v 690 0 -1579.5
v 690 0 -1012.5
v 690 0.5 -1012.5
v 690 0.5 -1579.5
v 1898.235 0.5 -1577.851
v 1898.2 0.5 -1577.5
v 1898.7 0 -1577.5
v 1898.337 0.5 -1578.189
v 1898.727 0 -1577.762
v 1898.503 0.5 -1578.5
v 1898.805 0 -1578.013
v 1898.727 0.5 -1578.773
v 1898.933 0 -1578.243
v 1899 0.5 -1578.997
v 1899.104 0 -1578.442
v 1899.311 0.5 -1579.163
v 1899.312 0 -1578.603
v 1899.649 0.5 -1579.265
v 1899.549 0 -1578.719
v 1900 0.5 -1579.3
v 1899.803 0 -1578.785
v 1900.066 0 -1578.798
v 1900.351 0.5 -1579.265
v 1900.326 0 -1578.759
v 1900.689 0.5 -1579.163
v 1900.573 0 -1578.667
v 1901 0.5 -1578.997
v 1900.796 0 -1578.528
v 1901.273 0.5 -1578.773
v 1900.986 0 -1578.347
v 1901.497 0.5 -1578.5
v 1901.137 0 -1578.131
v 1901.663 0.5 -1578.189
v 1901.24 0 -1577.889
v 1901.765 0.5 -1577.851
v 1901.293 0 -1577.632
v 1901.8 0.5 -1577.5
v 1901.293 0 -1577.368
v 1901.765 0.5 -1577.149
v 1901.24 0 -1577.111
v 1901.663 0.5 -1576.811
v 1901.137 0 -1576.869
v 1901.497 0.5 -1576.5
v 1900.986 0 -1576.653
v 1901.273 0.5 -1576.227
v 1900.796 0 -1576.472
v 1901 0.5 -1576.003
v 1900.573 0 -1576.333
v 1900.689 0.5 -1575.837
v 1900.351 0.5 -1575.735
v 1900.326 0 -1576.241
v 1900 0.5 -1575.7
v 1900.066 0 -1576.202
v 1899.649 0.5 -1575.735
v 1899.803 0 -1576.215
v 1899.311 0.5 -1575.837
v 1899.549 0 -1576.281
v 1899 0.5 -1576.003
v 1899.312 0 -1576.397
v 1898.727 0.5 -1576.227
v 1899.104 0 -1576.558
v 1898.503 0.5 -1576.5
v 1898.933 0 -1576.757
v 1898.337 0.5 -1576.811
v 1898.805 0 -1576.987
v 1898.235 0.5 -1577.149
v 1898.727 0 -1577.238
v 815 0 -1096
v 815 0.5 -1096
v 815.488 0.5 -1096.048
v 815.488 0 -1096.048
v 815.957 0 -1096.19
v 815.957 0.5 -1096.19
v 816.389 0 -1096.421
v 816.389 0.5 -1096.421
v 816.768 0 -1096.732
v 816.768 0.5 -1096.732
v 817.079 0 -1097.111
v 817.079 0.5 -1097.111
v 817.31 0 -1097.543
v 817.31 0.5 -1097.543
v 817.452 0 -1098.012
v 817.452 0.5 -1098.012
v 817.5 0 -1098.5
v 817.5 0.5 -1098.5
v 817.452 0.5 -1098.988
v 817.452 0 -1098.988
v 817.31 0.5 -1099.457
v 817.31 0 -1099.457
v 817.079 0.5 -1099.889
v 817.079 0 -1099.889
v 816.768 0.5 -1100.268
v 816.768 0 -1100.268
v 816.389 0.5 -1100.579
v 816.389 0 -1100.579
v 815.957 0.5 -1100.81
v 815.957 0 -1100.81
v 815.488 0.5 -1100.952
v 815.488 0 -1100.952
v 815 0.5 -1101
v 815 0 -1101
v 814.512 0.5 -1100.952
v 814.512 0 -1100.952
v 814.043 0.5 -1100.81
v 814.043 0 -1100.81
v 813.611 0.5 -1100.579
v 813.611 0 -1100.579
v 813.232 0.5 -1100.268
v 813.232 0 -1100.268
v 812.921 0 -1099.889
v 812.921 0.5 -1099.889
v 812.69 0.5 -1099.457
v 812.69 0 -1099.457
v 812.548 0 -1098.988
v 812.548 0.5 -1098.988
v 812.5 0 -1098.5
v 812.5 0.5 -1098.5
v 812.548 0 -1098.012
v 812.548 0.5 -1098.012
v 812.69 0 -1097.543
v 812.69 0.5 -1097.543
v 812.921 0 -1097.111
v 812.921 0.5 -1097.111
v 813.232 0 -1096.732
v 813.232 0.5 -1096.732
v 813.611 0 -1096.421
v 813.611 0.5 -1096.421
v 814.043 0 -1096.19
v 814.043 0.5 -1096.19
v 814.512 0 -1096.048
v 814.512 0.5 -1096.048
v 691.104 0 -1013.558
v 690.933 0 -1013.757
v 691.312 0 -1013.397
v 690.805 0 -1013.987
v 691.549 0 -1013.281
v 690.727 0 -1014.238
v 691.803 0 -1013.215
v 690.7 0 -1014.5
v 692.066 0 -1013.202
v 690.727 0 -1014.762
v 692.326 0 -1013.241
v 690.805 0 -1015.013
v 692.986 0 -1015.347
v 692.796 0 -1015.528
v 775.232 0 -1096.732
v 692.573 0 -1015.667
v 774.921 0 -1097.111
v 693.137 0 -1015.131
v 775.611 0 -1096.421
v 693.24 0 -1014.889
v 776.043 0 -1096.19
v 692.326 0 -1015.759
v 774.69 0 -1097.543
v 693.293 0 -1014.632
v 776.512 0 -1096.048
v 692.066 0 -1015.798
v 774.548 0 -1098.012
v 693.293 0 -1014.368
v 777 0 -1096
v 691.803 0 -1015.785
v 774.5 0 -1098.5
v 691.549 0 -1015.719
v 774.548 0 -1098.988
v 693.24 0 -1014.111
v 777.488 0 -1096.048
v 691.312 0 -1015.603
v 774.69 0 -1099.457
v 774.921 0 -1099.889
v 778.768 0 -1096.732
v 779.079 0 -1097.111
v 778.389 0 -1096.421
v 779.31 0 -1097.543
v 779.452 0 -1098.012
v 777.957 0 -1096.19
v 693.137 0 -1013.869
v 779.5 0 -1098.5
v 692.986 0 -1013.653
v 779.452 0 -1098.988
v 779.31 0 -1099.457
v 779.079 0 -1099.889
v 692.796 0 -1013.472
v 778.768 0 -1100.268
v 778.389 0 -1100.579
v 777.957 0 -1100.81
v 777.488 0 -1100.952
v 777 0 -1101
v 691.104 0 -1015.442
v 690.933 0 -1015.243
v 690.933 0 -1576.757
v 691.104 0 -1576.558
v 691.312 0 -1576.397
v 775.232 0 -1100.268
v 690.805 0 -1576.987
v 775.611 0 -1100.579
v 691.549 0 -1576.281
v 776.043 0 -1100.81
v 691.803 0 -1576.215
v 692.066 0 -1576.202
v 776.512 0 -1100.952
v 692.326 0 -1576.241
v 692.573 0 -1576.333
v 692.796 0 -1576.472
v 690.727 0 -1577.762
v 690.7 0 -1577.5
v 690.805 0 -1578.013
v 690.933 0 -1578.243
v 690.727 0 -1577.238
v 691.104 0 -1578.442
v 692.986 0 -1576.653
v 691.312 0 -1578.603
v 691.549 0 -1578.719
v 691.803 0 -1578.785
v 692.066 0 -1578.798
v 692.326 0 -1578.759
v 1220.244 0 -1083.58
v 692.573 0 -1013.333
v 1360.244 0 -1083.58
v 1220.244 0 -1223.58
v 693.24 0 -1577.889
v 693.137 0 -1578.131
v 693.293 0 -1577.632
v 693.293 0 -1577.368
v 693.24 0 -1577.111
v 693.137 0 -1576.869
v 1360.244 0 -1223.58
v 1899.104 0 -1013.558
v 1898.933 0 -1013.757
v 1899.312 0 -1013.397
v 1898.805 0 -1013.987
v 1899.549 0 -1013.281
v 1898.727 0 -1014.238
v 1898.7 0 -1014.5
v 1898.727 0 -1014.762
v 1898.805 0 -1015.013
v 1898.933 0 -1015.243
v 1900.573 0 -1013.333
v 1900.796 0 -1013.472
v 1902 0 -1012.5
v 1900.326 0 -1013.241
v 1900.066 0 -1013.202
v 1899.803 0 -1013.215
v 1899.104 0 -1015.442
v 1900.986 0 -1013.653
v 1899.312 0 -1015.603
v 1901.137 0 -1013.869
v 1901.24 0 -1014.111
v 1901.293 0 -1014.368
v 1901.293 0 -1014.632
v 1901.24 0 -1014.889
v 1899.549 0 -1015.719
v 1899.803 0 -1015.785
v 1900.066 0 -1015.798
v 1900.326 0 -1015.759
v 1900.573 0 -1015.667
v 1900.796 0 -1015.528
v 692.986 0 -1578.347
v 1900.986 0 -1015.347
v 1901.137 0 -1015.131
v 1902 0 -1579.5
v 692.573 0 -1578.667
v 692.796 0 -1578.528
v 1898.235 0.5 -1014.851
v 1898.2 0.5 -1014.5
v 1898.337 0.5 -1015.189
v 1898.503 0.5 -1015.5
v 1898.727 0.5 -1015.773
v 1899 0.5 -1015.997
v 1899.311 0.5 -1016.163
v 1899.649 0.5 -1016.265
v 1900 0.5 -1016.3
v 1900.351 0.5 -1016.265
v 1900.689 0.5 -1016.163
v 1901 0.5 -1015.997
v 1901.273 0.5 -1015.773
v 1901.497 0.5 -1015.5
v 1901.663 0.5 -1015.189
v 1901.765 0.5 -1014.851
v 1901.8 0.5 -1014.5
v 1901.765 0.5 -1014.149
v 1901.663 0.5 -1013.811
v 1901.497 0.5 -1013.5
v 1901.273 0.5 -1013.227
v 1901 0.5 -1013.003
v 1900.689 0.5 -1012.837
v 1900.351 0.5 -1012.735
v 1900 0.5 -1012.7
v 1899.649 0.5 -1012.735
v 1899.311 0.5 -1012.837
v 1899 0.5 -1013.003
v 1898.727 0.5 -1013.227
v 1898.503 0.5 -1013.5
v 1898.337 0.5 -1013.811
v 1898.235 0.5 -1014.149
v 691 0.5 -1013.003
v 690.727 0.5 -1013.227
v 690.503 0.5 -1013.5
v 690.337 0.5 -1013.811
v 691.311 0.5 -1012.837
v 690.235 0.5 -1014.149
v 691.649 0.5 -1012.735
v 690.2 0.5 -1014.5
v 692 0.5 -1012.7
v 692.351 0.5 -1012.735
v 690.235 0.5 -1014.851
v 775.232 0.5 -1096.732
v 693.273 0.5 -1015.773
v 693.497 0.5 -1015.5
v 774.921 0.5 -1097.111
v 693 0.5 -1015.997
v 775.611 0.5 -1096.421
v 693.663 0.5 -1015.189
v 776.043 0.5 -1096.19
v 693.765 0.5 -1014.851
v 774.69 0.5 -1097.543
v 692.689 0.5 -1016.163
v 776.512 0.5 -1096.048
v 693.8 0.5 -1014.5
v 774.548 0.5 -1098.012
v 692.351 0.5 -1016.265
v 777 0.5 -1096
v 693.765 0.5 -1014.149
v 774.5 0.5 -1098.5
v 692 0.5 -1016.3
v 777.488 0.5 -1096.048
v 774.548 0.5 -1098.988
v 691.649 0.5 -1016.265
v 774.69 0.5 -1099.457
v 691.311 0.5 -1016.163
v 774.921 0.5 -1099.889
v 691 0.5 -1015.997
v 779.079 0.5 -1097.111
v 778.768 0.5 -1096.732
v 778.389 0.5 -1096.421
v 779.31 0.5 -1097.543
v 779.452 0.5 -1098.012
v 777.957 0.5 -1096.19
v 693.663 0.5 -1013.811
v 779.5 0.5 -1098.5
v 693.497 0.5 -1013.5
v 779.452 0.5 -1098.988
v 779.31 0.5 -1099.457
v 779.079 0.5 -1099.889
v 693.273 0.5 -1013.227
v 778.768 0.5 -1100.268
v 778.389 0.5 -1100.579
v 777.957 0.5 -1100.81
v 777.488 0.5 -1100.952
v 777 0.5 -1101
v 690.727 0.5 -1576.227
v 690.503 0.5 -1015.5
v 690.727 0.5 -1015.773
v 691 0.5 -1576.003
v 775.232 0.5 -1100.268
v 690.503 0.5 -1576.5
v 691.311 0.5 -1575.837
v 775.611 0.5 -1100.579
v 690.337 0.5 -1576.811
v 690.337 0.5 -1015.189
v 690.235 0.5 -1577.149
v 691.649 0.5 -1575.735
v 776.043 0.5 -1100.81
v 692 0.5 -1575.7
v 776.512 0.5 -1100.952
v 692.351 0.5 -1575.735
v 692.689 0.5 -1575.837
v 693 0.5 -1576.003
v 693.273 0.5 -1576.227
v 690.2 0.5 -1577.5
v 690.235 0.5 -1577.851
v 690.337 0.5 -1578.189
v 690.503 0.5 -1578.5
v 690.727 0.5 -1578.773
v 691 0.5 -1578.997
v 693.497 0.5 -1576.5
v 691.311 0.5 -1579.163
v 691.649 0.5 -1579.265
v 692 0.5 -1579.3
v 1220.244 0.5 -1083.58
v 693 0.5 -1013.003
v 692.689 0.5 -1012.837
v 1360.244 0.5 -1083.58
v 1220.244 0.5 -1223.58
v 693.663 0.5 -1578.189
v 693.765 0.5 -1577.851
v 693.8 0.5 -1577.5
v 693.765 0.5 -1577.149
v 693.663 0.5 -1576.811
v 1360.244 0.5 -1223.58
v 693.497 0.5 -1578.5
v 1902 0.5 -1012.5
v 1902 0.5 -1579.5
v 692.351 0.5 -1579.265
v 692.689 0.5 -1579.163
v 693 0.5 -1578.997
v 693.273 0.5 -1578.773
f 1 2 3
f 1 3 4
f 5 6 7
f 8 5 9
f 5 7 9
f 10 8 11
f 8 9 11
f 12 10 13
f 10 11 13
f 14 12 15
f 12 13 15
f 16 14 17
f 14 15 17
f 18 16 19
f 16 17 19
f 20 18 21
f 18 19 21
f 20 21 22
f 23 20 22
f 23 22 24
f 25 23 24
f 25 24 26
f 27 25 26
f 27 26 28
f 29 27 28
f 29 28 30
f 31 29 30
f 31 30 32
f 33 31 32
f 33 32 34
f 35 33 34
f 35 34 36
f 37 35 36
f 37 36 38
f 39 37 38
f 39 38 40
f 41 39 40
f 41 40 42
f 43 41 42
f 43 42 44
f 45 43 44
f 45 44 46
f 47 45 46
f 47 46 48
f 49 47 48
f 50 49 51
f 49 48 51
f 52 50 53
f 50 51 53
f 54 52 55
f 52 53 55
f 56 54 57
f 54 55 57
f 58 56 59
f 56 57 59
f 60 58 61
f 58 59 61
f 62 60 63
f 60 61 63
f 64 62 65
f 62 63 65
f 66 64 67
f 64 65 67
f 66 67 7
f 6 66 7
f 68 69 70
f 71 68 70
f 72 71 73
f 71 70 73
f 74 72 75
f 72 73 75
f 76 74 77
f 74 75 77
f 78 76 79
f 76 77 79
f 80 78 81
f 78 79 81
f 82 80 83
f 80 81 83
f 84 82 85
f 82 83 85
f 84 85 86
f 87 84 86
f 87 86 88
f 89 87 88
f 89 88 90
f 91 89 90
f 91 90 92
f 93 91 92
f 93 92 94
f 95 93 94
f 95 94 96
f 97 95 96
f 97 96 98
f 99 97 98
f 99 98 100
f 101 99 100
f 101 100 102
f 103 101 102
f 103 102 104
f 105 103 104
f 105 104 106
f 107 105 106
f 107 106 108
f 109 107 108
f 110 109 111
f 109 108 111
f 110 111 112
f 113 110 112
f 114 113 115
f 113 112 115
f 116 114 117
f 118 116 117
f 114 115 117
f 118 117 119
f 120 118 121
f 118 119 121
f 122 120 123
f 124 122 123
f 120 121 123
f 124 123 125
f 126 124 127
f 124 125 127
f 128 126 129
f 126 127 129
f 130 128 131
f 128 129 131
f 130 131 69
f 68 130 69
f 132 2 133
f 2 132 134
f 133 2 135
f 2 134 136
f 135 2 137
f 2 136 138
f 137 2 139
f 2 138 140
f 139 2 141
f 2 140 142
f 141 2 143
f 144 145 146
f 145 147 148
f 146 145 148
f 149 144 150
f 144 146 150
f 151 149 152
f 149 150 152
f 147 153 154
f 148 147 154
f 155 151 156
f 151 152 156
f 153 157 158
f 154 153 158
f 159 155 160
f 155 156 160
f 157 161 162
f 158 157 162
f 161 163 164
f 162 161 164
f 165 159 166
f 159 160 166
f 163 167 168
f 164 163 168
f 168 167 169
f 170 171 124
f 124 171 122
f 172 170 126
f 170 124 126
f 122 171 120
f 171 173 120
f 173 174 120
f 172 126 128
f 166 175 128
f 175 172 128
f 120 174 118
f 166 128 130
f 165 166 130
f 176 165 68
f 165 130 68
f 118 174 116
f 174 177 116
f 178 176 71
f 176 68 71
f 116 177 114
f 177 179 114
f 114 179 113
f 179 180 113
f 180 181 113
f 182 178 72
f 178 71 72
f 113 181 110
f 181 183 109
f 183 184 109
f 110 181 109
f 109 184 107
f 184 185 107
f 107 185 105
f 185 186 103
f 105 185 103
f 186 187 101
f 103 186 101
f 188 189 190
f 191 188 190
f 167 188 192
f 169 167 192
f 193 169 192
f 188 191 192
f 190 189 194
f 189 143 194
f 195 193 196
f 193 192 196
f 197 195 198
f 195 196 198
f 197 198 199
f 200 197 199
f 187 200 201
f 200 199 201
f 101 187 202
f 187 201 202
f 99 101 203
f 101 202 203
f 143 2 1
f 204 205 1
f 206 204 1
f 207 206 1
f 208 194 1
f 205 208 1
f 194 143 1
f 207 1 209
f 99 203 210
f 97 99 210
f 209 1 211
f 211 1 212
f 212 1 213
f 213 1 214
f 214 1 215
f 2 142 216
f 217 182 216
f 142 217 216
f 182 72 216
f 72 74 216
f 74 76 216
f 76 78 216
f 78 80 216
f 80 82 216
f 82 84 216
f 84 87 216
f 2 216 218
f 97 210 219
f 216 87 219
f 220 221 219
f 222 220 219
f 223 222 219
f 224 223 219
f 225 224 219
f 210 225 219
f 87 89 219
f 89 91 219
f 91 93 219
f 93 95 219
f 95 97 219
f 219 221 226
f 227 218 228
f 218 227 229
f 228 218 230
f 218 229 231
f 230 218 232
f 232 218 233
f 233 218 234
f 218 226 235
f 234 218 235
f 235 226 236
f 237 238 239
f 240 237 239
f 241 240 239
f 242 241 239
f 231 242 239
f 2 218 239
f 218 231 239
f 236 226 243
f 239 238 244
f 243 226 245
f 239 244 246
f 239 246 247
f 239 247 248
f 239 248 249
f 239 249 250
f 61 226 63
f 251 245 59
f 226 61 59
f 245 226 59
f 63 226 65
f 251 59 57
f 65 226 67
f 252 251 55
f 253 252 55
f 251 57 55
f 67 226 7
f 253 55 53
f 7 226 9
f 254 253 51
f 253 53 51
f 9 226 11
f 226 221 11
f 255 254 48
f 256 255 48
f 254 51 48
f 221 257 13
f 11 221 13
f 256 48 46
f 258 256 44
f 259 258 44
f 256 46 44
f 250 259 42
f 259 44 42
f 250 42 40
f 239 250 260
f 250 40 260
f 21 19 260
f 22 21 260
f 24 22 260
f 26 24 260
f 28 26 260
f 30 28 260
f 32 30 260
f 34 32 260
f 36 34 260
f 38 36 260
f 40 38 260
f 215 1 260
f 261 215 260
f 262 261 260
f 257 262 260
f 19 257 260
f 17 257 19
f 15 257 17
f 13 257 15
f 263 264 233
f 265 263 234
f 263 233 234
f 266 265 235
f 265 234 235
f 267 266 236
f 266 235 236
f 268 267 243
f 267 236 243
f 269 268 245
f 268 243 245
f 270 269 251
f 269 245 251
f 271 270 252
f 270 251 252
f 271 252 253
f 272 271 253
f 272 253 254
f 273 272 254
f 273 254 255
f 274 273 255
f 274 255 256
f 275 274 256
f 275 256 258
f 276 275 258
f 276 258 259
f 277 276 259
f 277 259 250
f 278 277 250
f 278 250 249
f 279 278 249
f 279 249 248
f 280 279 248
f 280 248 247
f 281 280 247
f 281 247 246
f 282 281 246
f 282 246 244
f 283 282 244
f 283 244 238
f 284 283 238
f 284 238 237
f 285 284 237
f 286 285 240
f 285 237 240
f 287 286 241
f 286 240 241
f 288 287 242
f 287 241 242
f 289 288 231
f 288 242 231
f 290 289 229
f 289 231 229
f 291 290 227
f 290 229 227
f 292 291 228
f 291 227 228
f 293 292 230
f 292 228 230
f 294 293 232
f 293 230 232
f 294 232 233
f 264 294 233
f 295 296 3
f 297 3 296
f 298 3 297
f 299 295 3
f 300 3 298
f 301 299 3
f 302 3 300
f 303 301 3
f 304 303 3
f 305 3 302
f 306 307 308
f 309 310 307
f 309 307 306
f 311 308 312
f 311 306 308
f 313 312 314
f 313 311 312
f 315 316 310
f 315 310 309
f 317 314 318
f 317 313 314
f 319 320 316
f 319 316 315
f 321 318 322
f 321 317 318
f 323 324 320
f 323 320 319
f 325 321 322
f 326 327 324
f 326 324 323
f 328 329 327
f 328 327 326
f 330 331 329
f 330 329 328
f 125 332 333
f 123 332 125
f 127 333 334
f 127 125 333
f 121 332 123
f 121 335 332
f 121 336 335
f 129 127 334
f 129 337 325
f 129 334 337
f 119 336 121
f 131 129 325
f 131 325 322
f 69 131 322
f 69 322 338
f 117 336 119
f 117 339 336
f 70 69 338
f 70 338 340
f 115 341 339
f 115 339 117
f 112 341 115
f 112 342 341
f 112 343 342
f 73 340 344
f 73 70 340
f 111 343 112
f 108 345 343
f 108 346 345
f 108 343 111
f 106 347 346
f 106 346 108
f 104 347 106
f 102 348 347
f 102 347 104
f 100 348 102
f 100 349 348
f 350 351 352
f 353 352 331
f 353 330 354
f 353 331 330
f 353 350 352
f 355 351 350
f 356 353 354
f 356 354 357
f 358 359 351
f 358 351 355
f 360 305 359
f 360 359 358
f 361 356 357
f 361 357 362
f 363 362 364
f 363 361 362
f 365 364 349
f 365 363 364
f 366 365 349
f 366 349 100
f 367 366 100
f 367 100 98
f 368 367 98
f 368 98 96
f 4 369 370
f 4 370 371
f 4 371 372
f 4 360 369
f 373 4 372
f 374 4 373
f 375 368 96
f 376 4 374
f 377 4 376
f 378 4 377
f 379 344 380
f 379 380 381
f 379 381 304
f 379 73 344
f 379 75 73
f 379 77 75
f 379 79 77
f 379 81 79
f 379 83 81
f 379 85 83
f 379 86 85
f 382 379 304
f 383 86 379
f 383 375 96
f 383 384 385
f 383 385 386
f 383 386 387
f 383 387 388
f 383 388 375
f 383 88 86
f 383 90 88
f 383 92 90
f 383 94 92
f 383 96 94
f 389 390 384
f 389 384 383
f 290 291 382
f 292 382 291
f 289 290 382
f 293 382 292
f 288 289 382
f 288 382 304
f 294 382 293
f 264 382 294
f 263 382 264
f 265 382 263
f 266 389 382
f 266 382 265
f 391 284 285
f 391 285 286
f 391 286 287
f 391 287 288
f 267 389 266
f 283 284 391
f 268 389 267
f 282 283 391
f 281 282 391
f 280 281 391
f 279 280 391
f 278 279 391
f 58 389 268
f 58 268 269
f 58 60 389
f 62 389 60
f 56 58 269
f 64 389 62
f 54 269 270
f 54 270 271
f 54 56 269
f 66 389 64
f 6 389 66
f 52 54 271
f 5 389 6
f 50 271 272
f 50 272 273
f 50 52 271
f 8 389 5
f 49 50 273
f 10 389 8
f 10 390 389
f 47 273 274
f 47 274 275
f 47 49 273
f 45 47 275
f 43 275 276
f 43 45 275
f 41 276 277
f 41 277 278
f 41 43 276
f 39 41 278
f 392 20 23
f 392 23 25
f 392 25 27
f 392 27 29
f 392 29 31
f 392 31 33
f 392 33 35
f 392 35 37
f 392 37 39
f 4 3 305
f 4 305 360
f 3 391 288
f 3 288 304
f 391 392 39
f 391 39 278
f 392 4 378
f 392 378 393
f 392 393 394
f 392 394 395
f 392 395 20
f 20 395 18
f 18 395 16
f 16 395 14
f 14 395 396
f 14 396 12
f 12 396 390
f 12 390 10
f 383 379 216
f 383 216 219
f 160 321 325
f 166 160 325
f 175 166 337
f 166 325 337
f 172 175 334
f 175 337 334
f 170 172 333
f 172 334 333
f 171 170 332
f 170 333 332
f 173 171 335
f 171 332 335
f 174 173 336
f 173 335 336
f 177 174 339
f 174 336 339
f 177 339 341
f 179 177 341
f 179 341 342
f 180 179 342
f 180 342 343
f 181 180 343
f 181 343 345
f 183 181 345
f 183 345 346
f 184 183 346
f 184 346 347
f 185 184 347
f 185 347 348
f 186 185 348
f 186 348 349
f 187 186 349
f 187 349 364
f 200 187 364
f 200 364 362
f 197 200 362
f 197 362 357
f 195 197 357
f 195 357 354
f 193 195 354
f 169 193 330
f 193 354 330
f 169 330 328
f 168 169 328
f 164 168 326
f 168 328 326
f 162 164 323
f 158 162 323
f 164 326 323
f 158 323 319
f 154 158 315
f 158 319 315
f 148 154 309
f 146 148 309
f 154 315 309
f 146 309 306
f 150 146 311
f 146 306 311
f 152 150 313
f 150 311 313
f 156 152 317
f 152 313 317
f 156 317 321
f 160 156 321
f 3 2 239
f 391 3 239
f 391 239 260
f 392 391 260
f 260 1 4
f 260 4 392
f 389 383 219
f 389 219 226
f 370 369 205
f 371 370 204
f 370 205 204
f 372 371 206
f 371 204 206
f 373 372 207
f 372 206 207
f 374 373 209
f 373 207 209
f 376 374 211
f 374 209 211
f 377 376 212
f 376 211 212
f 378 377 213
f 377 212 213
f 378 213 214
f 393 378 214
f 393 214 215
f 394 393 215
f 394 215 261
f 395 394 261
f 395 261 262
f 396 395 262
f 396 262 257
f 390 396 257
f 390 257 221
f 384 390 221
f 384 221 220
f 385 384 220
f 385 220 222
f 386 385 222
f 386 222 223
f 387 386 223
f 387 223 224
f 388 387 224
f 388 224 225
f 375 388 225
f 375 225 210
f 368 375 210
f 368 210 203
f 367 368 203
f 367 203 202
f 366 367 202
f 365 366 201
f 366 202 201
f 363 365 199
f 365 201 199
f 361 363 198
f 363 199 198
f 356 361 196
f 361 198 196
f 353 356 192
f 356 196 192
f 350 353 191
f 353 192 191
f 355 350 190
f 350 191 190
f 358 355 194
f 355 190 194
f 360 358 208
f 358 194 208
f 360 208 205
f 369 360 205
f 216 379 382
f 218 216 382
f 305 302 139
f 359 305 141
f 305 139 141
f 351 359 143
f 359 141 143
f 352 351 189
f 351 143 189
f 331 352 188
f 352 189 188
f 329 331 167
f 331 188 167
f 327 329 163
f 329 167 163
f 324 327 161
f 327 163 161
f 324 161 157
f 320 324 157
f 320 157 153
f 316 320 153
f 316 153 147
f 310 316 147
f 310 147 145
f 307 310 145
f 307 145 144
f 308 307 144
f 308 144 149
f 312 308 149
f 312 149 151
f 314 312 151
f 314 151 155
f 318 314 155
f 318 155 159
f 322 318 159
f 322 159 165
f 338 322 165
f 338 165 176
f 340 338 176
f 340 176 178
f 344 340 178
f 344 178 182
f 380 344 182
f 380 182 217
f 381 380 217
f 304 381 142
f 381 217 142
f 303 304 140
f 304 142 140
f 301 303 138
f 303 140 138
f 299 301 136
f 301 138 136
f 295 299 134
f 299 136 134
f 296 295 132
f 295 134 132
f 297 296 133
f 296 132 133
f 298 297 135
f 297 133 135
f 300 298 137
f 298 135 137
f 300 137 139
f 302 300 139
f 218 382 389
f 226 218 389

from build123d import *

# Parameters (mm, degrees)
SKETCH1_W                                            = 1212
SKETCH1_H                                            = 567
BOSS_EXTRUDE1_DEPTH                                  = 0.5
CSK_FOR_M1_6_COUNTERSUNK_FLAT_HEAD_SCREW_D           = 1.8
CSK_FOR_M1_6_COUNTERSUNK_FLAT_HEAD_SCREW_DEPTH       = 30
CSK_FOR_M1_6_COUNTERSUNK_FLAT_HEAD_SCREW_CSINK_D     = 3.6
CSK_FOR_M1_6_COUNTERSUNK_FLAT_HEAD_SCREW_CSINK_ANGLE = 90
CSK_FOR_M1_6_COUNTERSUNK_FLAT_HEAD_SCREW_TIP         = 0.540774557
SKETCH4_R                                            = 2.5
CUT_EXTRUDE1_DEPTH                                   = 3
SKETCH5_W                                            = 140
SKETCH5_H                                            = 140
CUT_EXTRUDE2_DEPTH                                   = 7


with BuildPart() as part:
    # Sketch1 → Boss-Extrude1 (new body)
    with BuildSketch(Plane(origin=(0, 0, 0), x_dir=(1, 0, 0), z_dir=(0, 1, 0))):
        with Locations((1295.999999997, 1296)):
            Rectangle(SKETCH1_W, SKETCH1_H)
    extrude(amount=BOSS_EXTRUDE1_DEPTH)

    # CSK for M1.6 Countersunk Flat Head Screw1
    with Locations(Plane(origin=(0, 0.5, 0), x_dir=(1, 0, 0), z_dir=(0, 1, 0))):
        with Locations((1899.999999997, 1577.5), (691.999999997, 1577.5), (691.999999997, 1014.5), (1899.999999997, 1014.5)):
            CounterSinkHole(CSK_FOR_M1_6_COUNTERSUNK_FLAT_HEAD_SCREW_D / 2, CSK_FOR_M1_6_COUNTERSUNK_FLAT_HEAD_SCREW_CSINK_D / 2, depth=CSK_FOR_M1_6_COUNTERSUNK_FLAT_HEAD_SCREW_DEPTH, counter_sink_angle=CSK_FOR_M1_6_COUNTERSUNK_FLAT_HEAD_SCREW_CSINK_ANGLE)
            with Locations((0, 0, -(CSK_FOR_M1_6_COUNTERSUNK_FLAT_HEAD_SCREW_DEPTH + CSK_FOR_M1_6_COUNTERSUNK_FLAT_HEAD_SCREW_TIP / 2))):  # 118° drill point
                Cone(0, CSK_FOR_M1_6_COUNTERSUNK_FLAT_HEAD_SCREW_D / 2, CSK_FOR_M1_6_COUNTERSUNK_FLAT_HEAD_SCREW_TIP, mode=Mode.SUBTRACT)

    # Sketch4 → Cut-Extrude1 (cut)
    with BuildSketch(Plane(origin=(0, 0.5, 0), x_dir=(1, 0, 0), z_dir=(0, 1, 0))):
        with Locations(Location((776.999999997, 1098.5, 0), (0, 0, 270))):
            Circle(SKETCH4_R)
        with Locations(Location((814.999999997, 1098.5, 0), (0, 0, 270))):
            Circle(SKETCH4_R)
    extrude(amount=-CUT_EXTRUDE1_DEPTH, mode=Mode.SUBTRACT)

    # Sketch5 → Cut-Extrude2 (cut)
    with BuildSketch(Plane(origin=(0, 0.5, 0), x_dir=(1, 0, 0), z_dir=(0, 1, 0))):
        with Locations((1290.243608368, 1153.58)):
            Rectangle(SKETCH5_W, SKETCH5_H)
    extrude(amount=-CUT_EXTRUDE2_DEPTH, mode=Mode.SUBTRACT)


solid = part.part
